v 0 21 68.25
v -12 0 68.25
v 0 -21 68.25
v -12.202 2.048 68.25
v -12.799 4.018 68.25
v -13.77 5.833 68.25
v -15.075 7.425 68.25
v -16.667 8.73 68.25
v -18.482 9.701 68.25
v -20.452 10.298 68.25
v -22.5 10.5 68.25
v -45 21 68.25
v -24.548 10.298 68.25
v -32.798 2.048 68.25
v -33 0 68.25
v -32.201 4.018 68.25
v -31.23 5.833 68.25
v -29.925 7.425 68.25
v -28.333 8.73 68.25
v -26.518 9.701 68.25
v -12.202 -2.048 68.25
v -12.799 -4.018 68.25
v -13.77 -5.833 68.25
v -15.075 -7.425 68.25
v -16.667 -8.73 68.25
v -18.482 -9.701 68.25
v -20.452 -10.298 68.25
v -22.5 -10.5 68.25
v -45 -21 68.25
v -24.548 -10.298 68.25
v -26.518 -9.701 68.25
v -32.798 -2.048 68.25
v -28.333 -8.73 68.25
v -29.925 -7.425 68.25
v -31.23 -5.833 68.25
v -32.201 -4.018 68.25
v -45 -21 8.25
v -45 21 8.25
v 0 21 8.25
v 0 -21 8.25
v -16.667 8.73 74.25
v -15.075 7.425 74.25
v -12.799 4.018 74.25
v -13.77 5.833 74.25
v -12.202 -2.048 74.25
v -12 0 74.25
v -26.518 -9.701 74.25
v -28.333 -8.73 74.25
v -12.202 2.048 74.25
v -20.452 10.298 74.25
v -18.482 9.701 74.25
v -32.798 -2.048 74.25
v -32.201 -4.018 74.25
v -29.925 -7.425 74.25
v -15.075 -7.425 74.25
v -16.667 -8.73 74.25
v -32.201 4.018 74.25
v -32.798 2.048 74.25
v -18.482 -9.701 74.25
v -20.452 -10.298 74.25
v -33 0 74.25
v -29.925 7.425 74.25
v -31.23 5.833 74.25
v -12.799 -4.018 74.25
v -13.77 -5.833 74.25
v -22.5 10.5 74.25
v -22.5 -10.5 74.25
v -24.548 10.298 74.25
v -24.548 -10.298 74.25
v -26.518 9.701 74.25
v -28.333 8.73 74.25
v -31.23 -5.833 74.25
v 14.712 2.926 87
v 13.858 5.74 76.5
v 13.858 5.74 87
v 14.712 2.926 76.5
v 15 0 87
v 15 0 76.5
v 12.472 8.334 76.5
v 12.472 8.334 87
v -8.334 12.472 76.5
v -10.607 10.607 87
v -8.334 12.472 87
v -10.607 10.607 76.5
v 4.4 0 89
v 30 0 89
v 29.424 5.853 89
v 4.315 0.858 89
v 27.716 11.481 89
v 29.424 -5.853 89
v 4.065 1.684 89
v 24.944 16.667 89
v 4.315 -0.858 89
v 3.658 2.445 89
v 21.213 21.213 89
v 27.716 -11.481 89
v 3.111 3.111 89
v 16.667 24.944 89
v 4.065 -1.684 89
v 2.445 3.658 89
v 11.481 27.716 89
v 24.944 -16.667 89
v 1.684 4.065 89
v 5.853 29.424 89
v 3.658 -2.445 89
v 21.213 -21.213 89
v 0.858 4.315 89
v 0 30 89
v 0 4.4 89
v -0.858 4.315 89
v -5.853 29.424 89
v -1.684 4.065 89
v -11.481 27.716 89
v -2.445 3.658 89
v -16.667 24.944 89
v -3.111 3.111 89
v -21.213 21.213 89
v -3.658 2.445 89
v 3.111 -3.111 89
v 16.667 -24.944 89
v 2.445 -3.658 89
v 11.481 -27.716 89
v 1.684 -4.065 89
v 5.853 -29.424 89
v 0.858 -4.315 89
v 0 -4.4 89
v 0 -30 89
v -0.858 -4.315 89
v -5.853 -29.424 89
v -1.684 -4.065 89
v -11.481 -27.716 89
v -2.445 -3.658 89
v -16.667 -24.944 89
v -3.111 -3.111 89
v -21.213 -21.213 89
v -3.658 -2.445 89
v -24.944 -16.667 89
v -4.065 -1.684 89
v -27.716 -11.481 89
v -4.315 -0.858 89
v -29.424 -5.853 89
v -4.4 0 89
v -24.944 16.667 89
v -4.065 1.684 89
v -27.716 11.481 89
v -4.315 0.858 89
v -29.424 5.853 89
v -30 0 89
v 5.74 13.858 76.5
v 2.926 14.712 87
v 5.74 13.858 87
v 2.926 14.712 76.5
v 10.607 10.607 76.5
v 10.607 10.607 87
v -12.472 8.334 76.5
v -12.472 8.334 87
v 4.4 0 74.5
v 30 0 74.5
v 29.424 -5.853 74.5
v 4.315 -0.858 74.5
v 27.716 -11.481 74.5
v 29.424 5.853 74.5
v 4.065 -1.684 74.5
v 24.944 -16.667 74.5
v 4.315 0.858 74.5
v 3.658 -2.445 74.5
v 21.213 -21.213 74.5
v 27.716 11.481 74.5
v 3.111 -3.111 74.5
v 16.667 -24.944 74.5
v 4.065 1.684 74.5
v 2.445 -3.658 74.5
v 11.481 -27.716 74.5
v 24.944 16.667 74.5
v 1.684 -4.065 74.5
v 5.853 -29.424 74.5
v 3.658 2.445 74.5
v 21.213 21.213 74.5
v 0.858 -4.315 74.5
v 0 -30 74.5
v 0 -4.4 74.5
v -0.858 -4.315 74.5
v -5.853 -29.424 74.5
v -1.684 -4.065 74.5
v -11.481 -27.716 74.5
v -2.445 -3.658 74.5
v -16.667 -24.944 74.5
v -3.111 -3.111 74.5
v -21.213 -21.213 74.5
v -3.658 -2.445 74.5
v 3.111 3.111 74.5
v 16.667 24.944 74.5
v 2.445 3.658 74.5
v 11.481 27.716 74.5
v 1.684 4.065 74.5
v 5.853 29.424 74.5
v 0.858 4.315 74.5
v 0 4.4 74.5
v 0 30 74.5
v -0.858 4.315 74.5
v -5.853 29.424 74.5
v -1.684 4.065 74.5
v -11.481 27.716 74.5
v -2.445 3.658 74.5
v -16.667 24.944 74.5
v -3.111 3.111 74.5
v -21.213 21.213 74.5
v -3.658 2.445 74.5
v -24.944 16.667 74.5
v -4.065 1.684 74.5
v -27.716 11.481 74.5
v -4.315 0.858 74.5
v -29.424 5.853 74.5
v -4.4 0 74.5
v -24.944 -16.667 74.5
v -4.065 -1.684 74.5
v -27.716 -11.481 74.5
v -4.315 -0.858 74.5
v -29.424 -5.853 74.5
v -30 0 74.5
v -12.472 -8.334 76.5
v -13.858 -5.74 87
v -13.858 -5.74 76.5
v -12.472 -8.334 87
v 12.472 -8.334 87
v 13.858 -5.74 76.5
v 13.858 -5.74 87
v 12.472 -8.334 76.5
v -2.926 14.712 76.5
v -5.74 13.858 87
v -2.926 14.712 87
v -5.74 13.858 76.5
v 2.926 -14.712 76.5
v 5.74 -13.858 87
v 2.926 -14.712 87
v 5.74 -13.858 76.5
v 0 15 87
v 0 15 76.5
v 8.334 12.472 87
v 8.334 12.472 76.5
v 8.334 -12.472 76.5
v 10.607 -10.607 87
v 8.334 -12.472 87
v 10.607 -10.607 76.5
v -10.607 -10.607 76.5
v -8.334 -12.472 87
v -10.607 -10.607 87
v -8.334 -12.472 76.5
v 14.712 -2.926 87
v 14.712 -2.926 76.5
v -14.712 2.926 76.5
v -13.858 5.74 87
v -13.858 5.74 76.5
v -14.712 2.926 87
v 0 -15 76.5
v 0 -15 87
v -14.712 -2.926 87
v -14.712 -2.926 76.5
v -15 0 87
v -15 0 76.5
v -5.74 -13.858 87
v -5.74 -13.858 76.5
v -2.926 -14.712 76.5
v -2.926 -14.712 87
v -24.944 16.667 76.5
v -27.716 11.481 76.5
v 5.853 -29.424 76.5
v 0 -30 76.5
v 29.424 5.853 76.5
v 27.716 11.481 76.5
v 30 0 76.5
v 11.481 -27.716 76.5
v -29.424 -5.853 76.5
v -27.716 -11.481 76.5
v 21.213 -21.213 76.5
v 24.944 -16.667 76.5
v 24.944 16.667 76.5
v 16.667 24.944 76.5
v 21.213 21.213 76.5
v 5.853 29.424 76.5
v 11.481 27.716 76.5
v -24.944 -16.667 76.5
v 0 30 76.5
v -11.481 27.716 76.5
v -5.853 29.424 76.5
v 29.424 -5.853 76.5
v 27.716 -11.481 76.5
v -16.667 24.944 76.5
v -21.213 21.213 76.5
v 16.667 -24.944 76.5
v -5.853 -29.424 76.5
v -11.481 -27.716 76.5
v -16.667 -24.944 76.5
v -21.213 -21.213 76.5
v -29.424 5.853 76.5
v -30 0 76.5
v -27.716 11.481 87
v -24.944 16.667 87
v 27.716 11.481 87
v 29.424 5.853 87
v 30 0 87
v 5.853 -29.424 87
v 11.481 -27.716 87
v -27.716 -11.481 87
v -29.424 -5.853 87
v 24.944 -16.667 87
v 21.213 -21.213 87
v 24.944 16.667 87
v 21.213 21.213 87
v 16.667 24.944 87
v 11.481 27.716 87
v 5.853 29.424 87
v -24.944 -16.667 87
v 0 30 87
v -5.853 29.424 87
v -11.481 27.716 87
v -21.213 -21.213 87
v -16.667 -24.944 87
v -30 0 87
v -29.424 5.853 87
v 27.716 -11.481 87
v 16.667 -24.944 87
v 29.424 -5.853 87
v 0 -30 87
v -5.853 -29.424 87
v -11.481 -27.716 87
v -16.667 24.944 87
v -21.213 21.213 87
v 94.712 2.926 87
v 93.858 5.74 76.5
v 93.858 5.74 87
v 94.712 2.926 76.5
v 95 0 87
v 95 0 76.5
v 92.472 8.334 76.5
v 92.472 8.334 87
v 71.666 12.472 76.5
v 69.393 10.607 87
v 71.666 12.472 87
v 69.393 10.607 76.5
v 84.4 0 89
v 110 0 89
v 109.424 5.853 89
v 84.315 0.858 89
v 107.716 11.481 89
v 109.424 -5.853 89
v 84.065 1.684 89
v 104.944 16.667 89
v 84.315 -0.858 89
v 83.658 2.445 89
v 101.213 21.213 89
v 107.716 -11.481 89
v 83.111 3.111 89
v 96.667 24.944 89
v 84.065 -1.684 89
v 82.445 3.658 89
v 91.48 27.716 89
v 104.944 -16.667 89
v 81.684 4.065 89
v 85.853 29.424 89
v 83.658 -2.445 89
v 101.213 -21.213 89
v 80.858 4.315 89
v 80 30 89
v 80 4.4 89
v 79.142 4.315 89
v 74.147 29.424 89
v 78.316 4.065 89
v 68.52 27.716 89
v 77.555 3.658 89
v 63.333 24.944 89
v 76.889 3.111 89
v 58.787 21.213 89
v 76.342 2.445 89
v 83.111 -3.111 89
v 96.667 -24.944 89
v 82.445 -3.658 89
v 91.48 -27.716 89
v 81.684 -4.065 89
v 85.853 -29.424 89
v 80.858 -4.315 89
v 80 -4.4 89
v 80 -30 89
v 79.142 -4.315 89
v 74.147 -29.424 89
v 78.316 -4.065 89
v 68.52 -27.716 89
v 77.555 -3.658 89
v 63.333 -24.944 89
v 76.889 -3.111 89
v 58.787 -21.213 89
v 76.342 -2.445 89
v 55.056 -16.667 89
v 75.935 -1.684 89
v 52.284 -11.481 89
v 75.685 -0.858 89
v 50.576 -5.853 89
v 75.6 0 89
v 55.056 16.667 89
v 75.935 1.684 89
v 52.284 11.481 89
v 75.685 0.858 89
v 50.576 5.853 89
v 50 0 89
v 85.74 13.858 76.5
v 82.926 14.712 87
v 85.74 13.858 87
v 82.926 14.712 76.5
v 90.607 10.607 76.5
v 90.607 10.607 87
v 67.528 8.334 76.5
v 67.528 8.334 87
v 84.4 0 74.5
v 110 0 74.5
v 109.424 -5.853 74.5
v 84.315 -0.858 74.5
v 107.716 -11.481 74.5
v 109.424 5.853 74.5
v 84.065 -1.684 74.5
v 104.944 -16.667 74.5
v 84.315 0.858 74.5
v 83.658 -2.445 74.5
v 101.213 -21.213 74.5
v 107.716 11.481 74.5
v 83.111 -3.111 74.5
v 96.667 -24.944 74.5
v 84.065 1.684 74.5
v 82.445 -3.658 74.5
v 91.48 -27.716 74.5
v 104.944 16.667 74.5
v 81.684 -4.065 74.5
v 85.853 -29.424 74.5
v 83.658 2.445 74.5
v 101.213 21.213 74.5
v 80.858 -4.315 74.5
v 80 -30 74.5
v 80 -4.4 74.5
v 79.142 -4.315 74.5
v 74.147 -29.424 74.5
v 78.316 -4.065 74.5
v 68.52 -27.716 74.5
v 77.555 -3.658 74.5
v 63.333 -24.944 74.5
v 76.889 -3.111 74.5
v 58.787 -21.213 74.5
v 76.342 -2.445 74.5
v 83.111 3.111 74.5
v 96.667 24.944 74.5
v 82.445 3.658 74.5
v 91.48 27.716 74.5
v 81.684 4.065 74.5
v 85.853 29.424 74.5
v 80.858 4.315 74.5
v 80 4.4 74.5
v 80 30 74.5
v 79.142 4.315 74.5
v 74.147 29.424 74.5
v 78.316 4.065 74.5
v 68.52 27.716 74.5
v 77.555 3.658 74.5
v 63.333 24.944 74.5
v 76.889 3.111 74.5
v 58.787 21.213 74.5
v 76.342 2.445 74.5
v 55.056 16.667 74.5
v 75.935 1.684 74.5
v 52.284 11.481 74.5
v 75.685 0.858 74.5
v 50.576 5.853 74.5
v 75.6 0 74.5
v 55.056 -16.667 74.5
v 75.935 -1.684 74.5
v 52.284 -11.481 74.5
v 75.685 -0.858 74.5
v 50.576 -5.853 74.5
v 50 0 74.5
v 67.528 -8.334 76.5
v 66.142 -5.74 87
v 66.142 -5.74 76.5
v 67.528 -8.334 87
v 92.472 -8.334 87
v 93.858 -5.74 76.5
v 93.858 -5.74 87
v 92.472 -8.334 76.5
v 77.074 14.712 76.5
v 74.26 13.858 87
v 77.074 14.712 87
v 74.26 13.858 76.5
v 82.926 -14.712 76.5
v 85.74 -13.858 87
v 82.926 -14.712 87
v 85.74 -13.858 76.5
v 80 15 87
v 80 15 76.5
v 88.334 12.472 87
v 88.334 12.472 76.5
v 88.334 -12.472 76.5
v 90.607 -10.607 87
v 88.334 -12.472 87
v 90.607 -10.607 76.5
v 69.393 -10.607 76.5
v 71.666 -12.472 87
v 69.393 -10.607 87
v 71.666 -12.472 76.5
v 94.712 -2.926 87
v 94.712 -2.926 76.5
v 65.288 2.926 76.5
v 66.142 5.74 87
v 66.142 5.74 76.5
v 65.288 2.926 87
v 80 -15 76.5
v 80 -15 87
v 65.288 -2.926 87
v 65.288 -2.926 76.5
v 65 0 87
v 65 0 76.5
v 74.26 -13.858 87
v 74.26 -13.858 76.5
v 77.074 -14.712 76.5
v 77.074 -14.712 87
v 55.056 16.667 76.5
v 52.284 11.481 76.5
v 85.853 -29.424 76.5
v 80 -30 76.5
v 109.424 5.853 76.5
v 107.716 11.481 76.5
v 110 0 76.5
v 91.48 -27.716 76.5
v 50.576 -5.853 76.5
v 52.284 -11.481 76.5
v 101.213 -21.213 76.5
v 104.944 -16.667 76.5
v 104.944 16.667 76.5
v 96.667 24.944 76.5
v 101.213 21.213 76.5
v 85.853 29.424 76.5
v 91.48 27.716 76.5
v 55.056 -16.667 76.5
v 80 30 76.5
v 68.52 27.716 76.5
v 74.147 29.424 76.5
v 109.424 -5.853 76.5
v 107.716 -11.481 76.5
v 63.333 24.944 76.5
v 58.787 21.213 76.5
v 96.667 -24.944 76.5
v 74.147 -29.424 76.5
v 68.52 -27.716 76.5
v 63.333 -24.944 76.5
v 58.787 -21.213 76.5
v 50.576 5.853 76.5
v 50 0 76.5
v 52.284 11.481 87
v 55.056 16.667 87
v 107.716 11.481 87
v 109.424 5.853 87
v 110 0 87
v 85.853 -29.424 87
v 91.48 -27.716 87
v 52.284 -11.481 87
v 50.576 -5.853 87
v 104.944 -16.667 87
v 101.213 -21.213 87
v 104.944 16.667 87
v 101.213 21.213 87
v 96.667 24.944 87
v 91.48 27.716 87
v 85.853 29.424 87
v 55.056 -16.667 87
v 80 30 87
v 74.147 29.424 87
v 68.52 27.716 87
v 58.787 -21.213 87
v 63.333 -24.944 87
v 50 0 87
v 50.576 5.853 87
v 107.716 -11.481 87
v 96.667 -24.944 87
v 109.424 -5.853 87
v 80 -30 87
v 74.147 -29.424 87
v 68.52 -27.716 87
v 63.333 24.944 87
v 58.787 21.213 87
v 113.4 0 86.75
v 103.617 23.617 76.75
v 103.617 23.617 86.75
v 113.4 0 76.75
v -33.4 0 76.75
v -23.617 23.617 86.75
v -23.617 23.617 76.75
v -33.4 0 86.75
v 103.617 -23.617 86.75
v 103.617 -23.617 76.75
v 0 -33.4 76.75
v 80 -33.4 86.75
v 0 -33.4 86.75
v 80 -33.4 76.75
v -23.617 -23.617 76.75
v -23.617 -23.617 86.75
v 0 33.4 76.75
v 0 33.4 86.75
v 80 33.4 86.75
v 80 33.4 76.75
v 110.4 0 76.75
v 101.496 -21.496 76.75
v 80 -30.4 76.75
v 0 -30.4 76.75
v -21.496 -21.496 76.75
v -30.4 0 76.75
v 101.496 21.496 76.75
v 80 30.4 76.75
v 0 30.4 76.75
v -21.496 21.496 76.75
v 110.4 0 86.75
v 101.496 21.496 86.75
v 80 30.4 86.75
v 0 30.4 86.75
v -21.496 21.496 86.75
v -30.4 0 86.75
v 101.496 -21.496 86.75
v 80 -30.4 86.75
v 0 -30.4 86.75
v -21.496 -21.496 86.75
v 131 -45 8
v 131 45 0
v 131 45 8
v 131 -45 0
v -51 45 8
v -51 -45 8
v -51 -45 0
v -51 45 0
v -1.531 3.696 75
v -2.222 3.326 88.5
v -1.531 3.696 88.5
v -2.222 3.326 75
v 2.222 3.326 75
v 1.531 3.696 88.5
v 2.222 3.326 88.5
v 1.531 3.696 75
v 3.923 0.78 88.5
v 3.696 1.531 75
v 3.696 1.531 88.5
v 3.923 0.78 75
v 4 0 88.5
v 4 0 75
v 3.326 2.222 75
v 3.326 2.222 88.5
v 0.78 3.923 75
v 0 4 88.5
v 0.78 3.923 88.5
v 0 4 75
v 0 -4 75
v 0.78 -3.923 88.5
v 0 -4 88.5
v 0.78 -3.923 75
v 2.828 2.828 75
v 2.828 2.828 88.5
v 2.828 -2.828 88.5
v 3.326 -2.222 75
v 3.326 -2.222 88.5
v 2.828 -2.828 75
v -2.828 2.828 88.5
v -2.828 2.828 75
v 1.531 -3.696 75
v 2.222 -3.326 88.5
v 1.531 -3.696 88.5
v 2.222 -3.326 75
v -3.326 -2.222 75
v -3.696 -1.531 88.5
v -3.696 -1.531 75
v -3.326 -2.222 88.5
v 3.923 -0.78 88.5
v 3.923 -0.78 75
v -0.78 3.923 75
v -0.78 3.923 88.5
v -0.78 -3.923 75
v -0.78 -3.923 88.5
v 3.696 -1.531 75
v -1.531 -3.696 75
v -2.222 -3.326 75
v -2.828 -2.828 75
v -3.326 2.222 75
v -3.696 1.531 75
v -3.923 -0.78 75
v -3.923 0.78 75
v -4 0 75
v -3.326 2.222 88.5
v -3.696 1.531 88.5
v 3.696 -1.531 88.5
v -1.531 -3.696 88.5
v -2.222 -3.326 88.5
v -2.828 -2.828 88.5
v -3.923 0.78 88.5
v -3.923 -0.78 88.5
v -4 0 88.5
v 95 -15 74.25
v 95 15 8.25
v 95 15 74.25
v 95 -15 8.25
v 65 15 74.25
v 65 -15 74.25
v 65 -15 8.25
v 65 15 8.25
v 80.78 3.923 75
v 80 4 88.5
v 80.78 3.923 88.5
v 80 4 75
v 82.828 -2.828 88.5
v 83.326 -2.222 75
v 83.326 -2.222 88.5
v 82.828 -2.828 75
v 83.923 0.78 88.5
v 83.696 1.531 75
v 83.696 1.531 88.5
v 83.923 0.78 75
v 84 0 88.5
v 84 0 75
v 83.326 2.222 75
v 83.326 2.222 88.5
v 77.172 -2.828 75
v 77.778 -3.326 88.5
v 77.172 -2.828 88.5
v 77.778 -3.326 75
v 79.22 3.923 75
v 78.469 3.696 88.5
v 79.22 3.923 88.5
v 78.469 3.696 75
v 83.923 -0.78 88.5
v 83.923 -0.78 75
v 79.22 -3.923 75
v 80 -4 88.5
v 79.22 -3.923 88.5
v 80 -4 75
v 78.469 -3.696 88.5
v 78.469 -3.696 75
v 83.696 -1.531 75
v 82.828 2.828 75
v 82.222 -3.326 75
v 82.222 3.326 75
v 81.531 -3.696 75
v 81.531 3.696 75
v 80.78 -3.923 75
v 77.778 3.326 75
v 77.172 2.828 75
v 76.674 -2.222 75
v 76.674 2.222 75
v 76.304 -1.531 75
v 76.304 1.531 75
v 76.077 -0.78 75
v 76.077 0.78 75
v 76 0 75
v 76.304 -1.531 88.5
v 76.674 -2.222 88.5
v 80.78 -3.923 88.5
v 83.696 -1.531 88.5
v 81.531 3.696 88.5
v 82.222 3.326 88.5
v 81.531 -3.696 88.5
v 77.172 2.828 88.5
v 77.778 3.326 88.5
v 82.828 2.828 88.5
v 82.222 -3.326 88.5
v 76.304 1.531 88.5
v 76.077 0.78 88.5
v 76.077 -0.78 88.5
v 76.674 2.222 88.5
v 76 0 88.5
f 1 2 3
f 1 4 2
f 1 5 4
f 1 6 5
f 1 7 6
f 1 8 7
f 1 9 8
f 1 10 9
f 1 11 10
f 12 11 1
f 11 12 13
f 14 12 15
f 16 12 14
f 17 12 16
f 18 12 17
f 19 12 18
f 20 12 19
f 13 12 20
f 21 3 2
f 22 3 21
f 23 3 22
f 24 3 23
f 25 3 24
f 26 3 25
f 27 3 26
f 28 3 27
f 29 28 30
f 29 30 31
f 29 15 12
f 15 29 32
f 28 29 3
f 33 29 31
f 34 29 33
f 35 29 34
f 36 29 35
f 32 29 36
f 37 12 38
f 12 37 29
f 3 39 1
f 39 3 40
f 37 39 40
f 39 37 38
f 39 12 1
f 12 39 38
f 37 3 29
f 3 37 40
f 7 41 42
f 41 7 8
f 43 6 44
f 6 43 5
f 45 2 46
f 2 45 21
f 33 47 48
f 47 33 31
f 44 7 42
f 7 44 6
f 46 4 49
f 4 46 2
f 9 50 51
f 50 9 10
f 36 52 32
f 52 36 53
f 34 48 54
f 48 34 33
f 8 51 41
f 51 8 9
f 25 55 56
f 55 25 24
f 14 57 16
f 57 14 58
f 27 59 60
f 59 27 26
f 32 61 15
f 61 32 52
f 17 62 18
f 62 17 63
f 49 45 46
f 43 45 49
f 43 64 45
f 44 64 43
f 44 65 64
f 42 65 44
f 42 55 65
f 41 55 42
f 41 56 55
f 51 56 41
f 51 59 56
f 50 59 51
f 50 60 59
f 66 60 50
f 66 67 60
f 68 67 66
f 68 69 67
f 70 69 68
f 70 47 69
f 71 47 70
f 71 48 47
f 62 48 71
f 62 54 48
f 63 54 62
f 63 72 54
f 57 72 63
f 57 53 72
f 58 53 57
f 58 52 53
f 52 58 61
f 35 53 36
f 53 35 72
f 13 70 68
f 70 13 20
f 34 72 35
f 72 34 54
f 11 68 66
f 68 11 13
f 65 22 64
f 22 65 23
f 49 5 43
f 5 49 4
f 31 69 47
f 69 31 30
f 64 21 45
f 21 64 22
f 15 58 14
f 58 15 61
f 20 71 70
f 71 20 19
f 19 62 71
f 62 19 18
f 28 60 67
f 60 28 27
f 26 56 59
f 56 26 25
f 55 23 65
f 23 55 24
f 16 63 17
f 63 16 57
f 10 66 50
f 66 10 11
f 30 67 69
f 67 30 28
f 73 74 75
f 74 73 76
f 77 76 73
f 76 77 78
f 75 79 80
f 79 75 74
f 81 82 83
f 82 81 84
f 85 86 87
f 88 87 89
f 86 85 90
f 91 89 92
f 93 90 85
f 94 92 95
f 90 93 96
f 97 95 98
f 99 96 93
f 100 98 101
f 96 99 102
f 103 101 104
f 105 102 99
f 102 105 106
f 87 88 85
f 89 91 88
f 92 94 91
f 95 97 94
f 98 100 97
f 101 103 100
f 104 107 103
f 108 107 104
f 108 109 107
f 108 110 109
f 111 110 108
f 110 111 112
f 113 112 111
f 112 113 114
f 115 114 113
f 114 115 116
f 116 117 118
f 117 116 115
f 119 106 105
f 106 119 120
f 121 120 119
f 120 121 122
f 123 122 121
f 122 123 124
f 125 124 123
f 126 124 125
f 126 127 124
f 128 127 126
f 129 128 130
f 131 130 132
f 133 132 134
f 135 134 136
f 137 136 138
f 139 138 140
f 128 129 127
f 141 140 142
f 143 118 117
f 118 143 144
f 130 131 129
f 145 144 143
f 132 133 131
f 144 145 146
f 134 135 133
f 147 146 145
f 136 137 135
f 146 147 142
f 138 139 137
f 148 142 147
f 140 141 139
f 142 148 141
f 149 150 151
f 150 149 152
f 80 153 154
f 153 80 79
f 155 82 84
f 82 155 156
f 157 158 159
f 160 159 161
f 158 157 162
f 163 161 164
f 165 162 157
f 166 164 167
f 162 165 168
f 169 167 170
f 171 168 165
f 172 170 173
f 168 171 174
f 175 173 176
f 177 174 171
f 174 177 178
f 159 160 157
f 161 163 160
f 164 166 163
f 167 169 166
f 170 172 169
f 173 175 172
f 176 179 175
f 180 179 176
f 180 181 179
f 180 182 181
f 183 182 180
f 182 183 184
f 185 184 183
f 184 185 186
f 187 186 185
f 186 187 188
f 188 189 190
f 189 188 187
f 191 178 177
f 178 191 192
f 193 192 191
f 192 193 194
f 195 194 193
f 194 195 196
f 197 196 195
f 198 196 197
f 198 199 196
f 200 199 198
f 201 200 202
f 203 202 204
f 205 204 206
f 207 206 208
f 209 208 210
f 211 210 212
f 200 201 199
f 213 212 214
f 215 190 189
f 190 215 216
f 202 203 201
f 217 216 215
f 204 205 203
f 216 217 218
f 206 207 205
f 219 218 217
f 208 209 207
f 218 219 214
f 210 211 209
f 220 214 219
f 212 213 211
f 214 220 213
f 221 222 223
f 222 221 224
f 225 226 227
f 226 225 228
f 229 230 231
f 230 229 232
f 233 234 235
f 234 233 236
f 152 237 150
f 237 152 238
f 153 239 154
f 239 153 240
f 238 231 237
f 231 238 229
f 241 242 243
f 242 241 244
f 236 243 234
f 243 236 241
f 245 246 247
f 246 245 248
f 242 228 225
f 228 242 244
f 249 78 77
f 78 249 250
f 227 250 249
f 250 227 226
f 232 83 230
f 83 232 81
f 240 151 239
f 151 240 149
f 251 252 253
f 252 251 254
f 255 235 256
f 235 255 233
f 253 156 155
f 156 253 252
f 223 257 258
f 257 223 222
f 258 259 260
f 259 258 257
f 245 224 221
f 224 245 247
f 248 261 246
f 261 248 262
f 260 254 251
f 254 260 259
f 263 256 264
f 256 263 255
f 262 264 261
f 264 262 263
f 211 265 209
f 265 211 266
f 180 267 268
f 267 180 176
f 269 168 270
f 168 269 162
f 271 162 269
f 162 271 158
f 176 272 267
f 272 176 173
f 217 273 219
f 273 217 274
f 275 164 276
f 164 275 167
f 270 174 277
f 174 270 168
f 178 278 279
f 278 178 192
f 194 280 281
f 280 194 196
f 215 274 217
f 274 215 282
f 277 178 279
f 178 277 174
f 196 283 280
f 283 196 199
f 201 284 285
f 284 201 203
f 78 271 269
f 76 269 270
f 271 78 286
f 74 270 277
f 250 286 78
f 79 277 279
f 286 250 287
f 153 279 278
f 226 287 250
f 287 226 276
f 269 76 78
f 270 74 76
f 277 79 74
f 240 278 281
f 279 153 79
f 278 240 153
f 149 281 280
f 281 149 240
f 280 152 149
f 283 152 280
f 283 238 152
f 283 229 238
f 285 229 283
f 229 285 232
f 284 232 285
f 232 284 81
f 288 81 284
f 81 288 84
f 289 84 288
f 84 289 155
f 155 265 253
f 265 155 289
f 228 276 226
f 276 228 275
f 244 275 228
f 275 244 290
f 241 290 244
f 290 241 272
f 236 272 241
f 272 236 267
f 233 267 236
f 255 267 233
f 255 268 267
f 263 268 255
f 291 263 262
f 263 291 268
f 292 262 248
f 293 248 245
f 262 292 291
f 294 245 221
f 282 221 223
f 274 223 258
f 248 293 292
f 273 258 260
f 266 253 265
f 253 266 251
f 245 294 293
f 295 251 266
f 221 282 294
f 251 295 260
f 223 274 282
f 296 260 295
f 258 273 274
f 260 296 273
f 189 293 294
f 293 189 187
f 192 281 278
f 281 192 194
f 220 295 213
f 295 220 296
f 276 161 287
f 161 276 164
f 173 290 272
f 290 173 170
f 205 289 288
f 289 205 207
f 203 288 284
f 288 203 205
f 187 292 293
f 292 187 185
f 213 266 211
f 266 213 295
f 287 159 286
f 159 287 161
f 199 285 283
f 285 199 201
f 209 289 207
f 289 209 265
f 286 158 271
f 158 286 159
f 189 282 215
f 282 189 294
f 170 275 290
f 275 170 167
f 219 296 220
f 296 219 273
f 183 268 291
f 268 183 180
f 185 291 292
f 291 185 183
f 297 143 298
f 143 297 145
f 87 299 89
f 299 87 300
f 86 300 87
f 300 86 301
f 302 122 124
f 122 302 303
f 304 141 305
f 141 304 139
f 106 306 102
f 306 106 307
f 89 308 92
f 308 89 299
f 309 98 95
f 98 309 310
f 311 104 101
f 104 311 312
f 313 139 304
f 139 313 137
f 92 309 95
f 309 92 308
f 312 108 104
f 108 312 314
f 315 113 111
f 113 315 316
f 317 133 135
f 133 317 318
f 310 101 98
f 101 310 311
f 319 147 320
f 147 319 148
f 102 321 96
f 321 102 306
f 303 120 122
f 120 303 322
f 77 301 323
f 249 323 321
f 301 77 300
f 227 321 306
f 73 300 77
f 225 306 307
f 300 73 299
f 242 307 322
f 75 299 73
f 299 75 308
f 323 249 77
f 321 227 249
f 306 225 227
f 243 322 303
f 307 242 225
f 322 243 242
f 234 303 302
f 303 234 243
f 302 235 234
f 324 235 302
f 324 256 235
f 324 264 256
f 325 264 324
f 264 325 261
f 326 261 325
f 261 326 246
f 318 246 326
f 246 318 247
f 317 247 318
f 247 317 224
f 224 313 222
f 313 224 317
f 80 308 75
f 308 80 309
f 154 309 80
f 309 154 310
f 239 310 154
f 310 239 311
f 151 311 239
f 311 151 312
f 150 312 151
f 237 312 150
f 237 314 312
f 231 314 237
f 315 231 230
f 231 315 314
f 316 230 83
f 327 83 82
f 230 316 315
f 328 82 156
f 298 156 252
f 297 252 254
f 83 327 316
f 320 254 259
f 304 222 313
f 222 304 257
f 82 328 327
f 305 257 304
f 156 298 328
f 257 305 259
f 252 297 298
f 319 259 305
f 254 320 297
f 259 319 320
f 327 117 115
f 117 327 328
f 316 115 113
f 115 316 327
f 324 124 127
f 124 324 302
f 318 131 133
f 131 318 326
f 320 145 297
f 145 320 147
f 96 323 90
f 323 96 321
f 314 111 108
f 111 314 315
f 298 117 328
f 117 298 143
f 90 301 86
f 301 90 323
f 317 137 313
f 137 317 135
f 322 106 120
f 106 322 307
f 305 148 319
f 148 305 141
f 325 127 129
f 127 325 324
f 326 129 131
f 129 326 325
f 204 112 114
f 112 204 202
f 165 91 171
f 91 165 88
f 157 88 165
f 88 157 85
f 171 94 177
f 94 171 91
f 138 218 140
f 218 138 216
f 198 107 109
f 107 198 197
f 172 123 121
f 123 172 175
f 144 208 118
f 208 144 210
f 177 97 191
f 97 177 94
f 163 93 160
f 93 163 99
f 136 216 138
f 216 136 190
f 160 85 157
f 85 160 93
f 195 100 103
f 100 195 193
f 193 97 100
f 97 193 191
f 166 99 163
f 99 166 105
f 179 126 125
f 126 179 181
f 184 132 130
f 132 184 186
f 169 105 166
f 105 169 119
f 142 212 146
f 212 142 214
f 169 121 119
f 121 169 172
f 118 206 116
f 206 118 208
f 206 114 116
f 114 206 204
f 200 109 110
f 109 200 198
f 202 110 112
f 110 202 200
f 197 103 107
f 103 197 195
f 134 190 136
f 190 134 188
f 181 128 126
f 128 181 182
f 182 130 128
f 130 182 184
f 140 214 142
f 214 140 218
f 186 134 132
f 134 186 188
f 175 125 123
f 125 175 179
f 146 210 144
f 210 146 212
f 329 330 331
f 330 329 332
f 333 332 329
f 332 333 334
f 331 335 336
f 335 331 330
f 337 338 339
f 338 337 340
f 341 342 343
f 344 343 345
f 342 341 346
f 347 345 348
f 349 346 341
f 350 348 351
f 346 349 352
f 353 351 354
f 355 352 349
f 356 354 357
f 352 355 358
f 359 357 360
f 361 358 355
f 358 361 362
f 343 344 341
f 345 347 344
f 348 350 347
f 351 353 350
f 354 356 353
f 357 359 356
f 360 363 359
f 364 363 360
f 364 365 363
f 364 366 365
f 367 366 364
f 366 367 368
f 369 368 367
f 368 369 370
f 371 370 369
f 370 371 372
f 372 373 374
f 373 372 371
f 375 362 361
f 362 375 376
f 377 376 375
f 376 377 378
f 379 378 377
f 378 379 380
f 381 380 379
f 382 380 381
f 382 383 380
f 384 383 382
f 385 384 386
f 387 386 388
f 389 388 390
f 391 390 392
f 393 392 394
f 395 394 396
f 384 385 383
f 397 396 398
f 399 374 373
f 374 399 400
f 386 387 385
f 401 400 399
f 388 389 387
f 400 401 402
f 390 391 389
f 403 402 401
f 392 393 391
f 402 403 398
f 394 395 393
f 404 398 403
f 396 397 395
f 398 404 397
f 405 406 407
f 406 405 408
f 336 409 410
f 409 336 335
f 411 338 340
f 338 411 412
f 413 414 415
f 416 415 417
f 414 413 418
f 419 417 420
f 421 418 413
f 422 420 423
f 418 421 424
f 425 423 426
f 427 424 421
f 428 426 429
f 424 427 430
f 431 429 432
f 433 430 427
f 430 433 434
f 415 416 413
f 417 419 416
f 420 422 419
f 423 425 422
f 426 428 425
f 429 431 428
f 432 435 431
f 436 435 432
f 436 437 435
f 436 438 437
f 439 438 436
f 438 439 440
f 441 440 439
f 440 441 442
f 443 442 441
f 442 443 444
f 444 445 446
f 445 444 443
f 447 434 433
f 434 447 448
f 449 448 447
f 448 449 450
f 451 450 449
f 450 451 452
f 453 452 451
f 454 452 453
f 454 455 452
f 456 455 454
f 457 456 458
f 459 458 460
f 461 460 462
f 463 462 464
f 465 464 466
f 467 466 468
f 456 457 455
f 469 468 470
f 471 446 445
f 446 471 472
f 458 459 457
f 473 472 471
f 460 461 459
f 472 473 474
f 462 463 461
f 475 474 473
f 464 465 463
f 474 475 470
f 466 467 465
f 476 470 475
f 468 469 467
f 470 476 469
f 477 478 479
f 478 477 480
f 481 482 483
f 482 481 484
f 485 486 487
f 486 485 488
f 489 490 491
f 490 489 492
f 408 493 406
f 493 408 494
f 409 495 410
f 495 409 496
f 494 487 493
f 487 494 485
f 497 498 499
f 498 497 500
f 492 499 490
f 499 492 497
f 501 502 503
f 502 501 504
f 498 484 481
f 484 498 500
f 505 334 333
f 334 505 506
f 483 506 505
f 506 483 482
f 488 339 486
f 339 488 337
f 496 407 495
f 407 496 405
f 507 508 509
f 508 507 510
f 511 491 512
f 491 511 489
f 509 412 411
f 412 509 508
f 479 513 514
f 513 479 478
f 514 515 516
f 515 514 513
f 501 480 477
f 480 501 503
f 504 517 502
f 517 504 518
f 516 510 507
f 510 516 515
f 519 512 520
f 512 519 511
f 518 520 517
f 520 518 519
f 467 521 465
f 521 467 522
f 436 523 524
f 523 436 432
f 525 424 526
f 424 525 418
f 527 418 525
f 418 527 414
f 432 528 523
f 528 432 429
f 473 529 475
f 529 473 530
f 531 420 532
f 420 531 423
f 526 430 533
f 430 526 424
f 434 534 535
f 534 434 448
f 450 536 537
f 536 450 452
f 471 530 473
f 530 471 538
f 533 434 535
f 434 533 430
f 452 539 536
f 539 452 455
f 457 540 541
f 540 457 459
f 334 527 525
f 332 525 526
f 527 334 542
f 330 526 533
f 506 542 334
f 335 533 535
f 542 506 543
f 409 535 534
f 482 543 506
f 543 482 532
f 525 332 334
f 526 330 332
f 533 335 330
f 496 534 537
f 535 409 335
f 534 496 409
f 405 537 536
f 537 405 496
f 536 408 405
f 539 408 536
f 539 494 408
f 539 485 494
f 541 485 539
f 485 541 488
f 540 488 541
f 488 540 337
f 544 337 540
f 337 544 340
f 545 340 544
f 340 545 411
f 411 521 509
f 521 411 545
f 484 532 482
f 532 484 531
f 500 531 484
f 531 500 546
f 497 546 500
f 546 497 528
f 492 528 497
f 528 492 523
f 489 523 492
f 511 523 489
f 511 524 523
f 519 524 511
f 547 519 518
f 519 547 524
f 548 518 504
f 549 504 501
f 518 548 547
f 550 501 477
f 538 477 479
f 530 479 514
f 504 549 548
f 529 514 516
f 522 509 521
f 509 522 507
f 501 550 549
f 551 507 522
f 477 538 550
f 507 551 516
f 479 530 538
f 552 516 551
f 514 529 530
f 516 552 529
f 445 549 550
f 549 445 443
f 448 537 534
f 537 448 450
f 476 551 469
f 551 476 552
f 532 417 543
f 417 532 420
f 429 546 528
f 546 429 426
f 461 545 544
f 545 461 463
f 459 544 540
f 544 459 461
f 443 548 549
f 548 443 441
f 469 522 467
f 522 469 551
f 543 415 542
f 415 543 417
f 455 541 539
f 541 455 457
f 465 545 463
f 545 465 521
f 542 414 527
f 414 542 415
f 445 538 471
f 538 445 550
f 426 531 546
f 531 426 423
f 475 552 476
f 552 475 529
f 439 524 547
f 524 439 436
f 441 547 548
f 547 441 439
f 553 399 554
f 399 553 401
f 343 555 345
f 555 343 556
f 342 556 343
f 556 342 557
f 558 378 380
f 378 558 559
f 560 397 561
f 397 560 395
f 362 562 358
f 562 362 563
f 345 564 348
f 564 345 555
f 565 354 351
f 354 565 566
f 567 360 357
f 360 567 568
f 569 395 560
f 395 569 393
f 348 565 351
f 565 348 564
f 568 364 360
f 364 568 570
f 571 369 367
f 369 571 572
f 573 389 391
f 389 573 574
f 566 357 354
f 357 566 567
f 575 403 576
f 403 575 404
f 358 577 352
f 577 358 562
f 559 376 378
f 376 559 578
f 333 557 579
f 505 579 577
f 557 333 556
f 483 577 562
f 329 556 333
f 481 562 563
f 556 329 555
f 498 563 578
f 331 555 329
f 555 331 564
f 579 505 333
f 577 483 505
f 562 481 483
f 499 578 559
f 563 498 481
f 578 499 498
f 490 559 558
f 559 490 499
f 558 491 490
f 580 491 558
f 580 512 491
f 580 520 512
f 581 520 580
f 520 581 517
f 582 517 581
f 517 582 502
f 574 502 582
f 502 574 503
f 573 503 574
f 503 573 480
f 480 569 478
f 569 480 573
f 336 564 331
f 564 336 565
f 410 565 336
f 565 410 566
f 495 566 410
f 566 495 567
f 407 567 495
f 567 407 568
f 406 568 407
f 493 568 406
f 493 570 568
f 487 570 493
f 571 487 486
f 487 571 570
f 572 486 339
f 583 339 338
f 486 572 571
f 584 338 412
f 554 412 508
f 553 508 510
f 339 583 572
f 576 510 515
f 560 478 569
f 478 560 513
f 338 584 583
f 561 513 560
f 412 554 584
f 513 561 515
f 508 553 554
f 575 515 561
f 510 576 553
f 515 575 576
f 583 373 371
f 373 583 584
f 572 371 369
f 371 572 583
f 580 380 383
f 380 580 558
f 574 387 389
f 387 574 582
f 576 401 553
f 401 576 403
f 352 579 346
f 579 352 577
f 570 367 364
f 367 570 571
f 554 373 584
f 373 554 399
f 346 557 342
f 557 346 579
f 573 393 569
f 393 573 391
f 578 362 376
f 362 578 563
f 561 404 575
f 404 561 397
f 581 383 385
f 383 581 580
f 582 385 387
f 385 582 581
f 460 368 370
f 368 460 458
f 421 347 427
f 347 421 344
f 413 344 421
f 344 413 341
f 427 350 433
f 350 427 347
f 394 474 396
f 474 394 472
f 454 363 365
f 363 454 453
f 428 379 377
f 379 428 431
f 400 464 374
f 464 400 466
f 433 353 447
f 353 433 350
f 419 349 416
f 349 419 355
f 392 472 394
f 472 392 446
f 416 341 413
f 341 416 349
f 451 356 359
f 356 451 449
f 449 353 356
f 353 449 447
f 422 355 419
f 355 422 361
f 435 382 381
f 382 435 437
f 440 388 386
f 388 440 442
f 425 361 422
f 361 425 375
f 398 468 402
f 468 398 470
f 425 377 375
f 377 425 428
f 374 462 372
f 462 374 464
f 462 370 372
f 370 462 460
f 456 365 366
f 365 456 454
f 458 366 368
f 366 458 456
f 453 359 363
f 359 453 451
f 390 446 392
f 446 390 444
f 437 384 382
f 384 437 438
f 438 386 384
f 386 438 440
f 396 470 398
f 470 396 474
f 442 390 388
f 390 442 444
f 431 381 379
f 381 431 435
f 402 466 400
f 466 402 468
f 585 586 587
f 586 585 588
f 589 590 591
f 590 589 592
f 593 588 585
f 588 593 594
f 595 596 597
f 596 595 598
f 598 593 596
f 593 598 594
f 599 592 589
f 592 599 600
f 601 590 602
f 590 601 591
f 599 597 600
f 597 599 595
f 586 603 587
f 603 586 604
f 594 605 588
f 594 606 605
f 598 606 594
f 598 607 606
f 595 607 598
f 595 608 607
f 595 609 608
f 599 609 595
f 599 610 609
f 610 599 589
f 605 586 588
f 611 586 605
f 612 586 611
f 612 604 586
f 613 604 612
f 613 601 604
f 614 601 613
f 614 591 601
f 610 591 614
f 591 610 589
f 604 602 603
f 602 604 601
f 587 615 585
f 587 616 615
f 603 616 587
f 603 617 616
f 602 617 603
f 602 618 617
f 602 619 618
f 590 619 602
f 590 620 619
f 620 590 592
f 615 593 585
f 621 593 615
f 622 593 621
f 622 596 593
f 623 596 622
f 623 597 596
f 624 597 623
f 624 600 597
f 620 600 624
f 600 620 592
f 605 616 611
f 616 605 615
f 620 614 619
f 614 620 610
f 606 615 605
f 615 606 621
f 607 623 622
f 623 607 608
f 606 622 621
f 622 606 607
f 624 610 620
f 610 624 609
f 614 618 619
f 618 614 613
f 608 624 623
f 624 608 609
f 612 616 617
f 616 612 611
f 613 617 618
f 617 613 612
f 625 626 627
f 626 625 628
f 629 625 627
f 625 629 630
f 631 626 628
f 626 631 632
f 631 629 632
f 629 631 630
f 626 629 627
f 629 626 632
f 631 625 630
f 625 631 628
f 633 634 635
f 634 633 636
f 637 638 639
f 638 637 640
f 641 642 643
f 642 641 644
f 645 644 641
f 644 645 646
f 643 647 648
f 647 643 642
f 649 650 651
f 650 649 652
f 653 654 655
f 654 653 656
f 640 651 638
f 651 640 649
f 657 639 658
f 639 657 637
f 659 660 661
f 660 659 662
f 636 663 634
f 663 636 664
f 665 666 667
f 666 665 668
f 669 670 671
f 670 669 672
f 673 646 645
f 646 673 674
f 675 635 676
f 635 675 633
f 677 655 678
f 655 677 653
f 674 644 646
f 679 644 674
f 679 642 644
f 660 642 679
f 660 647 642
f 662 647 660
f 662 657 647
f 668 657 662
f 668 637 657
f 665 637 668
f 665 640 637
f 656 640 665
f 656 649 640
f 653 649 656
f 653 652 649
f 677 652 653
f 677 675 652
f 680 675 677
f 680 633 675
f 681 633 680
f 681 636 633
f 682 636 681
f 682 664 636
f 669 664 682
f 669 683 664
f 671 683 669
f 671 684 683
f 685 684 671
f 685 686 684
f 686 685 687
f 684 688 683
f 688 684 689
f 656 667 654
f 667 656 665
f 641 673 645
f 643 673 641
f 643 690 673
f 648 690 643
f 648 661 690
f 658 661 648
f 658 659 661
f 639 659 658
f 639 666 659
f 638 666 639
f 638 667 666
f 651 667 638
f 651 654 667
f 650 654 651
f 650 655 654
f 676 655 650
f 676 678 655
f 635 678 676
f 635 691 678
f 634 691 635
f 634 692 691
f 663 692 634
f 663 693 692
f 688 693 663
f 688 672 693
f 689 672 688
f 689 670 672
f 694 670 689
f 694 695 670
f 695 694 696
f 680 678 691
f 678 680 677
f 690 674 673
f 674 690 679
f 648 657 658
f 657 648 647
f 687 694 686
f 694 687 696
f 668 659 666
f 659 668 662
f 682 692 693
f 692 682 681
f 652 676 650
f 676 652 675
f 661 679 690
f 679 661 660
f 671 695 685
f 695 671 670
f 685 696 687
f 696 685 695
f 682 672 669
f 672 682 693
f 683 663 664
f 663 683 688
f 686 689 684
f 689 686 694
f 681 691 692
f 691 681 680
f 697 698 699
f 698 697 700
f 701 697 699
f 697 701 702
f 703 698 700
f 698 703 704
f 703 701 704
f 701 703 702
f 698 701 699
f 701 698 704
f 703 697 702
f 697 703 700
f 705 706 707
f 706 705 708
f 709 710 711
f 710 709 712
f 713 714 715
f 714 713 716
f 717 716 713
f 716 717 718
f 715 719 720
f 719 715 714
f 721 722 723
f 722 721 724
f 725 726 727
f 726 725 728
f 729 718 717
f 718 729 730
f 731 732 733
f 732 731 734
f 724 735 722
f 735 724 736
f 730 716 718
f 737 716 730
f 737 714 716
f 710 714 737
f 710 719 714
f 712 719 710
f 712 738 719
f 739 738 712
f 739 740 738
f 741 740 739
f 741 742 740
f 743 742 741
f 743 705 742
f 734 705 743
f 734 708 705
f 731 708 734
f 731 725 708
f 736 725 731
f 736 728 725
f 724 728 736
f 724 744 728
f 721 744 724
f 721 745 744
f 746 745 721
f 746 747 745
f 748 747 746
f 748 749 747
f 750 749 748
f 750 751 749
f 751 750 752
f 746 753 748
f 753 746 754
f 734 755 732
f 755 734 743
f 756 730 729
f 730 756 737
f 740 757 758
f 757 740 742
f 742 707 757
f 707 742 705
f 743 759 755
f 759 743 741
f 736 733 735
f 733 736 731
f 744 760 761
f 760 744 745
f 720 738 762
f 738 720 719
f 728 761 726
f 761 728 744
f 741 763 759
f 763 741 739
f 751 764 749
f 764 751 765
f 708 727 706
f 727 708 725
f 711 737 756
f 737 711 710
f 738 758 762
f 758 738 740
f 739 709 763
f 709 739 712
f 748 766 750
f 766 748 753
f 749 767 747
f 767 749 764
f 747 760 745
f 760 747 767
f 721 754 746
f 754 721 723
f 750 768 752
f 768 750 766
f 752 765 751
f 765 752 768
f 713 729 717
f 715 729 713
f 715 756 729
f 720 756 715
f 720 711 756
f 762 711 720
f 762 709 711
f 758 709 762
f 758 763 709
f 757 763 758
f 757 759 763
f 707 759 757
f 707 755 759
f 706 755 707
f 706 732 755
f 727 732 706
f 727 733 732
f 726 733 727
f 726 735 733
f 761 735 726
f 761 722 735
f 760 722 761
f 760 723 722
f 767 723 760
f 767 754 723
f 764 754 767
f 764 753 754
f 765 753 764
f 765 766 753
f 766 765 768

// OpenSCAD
$fn = 32;

// ------------------------------------------------------------------------
// Motor belt drive: span 80 mm, pulleys d60, belt 10 mm wide
// Every part is its own module, assembly() places every instance.
// ------------------------------------------------------------------------

// --- part 1 ---
module base_plate() {
  difference() {
    translate([-91, -45, 0]) cube([182, 90, 8]);
  }
}

// --- part 2 ---
module motor() {
  union() {
    translate([-30, -21, 0]) cube([60, 42, 45]);
    translate([33, 0, 22.5]) rotate([0, 90, 0]) cylinder(h = 6, d = 21, center = true);
  }
}

// --- part 3 ---
module drive_shaft() {
  translate([0, 0, -6.75]) cylinder(h = 13.5, d = 8);
}

// --- part 4 ---
module pulley_drive() {
  difference() {
    union() {
      cylinder(h = 14.5, d = 30);
      cylinder(h = 2, d = 60);
      translate([0, 0, 12.5]) cylinder(h = 2, d = 60);
    }
    translate([0, 0, -1]) cylinder(h = 16.5, d = 8.8);
  }
}

// --- part 5 ---
module idler_post() {
  translate([-15, -15, 0]) cube([30, 30, 66]);
}

// --- part 6 ---
module driven_shaft() {
  translate([0, 0, -6.75]) cylinder(h = 13.5, d = 8);
}

// --- part 7 ---
module pulley_driven() {
  difference() {
    union() {
      cylinder(h = 14.5, d = 30);
      cylinder(h = 2, d = 60);
      translate([0, 0, 12.5]) cylinder(h = 2, d = 60);
    }
    translate([0, 0, -1]) cylinder(h = 16.5, d = 8.8);
  }
}

// --- part 8 ---
module drive_belt() {
  difference() {
    linear_extrude(height = 10) polygon(points = concat([for (a = [90 : 45 : 270]) [33.4 * cos(a), 33.4 * sin(a)]], [for (a = [270 : 45 : 450]) [80 + 33.4 * cos(a), 33.4 * sin(a)]]));
    translate([0, 0, -1]) linear_extrude(height = 12) polygon(points = concat([for (a = [90 : 45 : 270]) [30.4 * cos(a), 30.4 * sin(a)]], [for (a = [270 : 45 : 450]) [80 + 30.4 * cos(a), 30.4 * sin(a)]]));
  }
}

// --- assembly ---
module assembly() {
  color([0.80, 0.24, 0.20]) translate([40, 0, 0]) rotate([0, 0, 0]) base_plate();
  color([0.20, 0.45, 0.75]) translate([0, 0, 38.25]) rotate([0, 270, 0]) motor();
  color([0.25, 0.62, 0.32]) translate([0, 0, 81.75]) rotate([0, 0, 0]) drive_shaft();
  color([0.92, 0.70, 0.18]) translate([0, 0, 74.5]) rotate([0, 0, 0]) pulley_drive();
  color([0.58, 0.35, 0.70]) translate([80, 0, 8.25]) rotate([0, 0, 0]) idler_post();
  color([0.16, 0.66, 0.66]) translate([80, 0, 81.75]) rotate([0, 0, 0]) driven_shaft();
  color([0.85, 0.48, 0.18]) translate([80, 0, 74.5]) rotate([0, 0, 0]) pulley_driven();
  color([0.55, 0.60, 0.65]) translate([0, 0, 76.75]) rotate([0, 0, 0]) drive_belt();
}

assembly();
